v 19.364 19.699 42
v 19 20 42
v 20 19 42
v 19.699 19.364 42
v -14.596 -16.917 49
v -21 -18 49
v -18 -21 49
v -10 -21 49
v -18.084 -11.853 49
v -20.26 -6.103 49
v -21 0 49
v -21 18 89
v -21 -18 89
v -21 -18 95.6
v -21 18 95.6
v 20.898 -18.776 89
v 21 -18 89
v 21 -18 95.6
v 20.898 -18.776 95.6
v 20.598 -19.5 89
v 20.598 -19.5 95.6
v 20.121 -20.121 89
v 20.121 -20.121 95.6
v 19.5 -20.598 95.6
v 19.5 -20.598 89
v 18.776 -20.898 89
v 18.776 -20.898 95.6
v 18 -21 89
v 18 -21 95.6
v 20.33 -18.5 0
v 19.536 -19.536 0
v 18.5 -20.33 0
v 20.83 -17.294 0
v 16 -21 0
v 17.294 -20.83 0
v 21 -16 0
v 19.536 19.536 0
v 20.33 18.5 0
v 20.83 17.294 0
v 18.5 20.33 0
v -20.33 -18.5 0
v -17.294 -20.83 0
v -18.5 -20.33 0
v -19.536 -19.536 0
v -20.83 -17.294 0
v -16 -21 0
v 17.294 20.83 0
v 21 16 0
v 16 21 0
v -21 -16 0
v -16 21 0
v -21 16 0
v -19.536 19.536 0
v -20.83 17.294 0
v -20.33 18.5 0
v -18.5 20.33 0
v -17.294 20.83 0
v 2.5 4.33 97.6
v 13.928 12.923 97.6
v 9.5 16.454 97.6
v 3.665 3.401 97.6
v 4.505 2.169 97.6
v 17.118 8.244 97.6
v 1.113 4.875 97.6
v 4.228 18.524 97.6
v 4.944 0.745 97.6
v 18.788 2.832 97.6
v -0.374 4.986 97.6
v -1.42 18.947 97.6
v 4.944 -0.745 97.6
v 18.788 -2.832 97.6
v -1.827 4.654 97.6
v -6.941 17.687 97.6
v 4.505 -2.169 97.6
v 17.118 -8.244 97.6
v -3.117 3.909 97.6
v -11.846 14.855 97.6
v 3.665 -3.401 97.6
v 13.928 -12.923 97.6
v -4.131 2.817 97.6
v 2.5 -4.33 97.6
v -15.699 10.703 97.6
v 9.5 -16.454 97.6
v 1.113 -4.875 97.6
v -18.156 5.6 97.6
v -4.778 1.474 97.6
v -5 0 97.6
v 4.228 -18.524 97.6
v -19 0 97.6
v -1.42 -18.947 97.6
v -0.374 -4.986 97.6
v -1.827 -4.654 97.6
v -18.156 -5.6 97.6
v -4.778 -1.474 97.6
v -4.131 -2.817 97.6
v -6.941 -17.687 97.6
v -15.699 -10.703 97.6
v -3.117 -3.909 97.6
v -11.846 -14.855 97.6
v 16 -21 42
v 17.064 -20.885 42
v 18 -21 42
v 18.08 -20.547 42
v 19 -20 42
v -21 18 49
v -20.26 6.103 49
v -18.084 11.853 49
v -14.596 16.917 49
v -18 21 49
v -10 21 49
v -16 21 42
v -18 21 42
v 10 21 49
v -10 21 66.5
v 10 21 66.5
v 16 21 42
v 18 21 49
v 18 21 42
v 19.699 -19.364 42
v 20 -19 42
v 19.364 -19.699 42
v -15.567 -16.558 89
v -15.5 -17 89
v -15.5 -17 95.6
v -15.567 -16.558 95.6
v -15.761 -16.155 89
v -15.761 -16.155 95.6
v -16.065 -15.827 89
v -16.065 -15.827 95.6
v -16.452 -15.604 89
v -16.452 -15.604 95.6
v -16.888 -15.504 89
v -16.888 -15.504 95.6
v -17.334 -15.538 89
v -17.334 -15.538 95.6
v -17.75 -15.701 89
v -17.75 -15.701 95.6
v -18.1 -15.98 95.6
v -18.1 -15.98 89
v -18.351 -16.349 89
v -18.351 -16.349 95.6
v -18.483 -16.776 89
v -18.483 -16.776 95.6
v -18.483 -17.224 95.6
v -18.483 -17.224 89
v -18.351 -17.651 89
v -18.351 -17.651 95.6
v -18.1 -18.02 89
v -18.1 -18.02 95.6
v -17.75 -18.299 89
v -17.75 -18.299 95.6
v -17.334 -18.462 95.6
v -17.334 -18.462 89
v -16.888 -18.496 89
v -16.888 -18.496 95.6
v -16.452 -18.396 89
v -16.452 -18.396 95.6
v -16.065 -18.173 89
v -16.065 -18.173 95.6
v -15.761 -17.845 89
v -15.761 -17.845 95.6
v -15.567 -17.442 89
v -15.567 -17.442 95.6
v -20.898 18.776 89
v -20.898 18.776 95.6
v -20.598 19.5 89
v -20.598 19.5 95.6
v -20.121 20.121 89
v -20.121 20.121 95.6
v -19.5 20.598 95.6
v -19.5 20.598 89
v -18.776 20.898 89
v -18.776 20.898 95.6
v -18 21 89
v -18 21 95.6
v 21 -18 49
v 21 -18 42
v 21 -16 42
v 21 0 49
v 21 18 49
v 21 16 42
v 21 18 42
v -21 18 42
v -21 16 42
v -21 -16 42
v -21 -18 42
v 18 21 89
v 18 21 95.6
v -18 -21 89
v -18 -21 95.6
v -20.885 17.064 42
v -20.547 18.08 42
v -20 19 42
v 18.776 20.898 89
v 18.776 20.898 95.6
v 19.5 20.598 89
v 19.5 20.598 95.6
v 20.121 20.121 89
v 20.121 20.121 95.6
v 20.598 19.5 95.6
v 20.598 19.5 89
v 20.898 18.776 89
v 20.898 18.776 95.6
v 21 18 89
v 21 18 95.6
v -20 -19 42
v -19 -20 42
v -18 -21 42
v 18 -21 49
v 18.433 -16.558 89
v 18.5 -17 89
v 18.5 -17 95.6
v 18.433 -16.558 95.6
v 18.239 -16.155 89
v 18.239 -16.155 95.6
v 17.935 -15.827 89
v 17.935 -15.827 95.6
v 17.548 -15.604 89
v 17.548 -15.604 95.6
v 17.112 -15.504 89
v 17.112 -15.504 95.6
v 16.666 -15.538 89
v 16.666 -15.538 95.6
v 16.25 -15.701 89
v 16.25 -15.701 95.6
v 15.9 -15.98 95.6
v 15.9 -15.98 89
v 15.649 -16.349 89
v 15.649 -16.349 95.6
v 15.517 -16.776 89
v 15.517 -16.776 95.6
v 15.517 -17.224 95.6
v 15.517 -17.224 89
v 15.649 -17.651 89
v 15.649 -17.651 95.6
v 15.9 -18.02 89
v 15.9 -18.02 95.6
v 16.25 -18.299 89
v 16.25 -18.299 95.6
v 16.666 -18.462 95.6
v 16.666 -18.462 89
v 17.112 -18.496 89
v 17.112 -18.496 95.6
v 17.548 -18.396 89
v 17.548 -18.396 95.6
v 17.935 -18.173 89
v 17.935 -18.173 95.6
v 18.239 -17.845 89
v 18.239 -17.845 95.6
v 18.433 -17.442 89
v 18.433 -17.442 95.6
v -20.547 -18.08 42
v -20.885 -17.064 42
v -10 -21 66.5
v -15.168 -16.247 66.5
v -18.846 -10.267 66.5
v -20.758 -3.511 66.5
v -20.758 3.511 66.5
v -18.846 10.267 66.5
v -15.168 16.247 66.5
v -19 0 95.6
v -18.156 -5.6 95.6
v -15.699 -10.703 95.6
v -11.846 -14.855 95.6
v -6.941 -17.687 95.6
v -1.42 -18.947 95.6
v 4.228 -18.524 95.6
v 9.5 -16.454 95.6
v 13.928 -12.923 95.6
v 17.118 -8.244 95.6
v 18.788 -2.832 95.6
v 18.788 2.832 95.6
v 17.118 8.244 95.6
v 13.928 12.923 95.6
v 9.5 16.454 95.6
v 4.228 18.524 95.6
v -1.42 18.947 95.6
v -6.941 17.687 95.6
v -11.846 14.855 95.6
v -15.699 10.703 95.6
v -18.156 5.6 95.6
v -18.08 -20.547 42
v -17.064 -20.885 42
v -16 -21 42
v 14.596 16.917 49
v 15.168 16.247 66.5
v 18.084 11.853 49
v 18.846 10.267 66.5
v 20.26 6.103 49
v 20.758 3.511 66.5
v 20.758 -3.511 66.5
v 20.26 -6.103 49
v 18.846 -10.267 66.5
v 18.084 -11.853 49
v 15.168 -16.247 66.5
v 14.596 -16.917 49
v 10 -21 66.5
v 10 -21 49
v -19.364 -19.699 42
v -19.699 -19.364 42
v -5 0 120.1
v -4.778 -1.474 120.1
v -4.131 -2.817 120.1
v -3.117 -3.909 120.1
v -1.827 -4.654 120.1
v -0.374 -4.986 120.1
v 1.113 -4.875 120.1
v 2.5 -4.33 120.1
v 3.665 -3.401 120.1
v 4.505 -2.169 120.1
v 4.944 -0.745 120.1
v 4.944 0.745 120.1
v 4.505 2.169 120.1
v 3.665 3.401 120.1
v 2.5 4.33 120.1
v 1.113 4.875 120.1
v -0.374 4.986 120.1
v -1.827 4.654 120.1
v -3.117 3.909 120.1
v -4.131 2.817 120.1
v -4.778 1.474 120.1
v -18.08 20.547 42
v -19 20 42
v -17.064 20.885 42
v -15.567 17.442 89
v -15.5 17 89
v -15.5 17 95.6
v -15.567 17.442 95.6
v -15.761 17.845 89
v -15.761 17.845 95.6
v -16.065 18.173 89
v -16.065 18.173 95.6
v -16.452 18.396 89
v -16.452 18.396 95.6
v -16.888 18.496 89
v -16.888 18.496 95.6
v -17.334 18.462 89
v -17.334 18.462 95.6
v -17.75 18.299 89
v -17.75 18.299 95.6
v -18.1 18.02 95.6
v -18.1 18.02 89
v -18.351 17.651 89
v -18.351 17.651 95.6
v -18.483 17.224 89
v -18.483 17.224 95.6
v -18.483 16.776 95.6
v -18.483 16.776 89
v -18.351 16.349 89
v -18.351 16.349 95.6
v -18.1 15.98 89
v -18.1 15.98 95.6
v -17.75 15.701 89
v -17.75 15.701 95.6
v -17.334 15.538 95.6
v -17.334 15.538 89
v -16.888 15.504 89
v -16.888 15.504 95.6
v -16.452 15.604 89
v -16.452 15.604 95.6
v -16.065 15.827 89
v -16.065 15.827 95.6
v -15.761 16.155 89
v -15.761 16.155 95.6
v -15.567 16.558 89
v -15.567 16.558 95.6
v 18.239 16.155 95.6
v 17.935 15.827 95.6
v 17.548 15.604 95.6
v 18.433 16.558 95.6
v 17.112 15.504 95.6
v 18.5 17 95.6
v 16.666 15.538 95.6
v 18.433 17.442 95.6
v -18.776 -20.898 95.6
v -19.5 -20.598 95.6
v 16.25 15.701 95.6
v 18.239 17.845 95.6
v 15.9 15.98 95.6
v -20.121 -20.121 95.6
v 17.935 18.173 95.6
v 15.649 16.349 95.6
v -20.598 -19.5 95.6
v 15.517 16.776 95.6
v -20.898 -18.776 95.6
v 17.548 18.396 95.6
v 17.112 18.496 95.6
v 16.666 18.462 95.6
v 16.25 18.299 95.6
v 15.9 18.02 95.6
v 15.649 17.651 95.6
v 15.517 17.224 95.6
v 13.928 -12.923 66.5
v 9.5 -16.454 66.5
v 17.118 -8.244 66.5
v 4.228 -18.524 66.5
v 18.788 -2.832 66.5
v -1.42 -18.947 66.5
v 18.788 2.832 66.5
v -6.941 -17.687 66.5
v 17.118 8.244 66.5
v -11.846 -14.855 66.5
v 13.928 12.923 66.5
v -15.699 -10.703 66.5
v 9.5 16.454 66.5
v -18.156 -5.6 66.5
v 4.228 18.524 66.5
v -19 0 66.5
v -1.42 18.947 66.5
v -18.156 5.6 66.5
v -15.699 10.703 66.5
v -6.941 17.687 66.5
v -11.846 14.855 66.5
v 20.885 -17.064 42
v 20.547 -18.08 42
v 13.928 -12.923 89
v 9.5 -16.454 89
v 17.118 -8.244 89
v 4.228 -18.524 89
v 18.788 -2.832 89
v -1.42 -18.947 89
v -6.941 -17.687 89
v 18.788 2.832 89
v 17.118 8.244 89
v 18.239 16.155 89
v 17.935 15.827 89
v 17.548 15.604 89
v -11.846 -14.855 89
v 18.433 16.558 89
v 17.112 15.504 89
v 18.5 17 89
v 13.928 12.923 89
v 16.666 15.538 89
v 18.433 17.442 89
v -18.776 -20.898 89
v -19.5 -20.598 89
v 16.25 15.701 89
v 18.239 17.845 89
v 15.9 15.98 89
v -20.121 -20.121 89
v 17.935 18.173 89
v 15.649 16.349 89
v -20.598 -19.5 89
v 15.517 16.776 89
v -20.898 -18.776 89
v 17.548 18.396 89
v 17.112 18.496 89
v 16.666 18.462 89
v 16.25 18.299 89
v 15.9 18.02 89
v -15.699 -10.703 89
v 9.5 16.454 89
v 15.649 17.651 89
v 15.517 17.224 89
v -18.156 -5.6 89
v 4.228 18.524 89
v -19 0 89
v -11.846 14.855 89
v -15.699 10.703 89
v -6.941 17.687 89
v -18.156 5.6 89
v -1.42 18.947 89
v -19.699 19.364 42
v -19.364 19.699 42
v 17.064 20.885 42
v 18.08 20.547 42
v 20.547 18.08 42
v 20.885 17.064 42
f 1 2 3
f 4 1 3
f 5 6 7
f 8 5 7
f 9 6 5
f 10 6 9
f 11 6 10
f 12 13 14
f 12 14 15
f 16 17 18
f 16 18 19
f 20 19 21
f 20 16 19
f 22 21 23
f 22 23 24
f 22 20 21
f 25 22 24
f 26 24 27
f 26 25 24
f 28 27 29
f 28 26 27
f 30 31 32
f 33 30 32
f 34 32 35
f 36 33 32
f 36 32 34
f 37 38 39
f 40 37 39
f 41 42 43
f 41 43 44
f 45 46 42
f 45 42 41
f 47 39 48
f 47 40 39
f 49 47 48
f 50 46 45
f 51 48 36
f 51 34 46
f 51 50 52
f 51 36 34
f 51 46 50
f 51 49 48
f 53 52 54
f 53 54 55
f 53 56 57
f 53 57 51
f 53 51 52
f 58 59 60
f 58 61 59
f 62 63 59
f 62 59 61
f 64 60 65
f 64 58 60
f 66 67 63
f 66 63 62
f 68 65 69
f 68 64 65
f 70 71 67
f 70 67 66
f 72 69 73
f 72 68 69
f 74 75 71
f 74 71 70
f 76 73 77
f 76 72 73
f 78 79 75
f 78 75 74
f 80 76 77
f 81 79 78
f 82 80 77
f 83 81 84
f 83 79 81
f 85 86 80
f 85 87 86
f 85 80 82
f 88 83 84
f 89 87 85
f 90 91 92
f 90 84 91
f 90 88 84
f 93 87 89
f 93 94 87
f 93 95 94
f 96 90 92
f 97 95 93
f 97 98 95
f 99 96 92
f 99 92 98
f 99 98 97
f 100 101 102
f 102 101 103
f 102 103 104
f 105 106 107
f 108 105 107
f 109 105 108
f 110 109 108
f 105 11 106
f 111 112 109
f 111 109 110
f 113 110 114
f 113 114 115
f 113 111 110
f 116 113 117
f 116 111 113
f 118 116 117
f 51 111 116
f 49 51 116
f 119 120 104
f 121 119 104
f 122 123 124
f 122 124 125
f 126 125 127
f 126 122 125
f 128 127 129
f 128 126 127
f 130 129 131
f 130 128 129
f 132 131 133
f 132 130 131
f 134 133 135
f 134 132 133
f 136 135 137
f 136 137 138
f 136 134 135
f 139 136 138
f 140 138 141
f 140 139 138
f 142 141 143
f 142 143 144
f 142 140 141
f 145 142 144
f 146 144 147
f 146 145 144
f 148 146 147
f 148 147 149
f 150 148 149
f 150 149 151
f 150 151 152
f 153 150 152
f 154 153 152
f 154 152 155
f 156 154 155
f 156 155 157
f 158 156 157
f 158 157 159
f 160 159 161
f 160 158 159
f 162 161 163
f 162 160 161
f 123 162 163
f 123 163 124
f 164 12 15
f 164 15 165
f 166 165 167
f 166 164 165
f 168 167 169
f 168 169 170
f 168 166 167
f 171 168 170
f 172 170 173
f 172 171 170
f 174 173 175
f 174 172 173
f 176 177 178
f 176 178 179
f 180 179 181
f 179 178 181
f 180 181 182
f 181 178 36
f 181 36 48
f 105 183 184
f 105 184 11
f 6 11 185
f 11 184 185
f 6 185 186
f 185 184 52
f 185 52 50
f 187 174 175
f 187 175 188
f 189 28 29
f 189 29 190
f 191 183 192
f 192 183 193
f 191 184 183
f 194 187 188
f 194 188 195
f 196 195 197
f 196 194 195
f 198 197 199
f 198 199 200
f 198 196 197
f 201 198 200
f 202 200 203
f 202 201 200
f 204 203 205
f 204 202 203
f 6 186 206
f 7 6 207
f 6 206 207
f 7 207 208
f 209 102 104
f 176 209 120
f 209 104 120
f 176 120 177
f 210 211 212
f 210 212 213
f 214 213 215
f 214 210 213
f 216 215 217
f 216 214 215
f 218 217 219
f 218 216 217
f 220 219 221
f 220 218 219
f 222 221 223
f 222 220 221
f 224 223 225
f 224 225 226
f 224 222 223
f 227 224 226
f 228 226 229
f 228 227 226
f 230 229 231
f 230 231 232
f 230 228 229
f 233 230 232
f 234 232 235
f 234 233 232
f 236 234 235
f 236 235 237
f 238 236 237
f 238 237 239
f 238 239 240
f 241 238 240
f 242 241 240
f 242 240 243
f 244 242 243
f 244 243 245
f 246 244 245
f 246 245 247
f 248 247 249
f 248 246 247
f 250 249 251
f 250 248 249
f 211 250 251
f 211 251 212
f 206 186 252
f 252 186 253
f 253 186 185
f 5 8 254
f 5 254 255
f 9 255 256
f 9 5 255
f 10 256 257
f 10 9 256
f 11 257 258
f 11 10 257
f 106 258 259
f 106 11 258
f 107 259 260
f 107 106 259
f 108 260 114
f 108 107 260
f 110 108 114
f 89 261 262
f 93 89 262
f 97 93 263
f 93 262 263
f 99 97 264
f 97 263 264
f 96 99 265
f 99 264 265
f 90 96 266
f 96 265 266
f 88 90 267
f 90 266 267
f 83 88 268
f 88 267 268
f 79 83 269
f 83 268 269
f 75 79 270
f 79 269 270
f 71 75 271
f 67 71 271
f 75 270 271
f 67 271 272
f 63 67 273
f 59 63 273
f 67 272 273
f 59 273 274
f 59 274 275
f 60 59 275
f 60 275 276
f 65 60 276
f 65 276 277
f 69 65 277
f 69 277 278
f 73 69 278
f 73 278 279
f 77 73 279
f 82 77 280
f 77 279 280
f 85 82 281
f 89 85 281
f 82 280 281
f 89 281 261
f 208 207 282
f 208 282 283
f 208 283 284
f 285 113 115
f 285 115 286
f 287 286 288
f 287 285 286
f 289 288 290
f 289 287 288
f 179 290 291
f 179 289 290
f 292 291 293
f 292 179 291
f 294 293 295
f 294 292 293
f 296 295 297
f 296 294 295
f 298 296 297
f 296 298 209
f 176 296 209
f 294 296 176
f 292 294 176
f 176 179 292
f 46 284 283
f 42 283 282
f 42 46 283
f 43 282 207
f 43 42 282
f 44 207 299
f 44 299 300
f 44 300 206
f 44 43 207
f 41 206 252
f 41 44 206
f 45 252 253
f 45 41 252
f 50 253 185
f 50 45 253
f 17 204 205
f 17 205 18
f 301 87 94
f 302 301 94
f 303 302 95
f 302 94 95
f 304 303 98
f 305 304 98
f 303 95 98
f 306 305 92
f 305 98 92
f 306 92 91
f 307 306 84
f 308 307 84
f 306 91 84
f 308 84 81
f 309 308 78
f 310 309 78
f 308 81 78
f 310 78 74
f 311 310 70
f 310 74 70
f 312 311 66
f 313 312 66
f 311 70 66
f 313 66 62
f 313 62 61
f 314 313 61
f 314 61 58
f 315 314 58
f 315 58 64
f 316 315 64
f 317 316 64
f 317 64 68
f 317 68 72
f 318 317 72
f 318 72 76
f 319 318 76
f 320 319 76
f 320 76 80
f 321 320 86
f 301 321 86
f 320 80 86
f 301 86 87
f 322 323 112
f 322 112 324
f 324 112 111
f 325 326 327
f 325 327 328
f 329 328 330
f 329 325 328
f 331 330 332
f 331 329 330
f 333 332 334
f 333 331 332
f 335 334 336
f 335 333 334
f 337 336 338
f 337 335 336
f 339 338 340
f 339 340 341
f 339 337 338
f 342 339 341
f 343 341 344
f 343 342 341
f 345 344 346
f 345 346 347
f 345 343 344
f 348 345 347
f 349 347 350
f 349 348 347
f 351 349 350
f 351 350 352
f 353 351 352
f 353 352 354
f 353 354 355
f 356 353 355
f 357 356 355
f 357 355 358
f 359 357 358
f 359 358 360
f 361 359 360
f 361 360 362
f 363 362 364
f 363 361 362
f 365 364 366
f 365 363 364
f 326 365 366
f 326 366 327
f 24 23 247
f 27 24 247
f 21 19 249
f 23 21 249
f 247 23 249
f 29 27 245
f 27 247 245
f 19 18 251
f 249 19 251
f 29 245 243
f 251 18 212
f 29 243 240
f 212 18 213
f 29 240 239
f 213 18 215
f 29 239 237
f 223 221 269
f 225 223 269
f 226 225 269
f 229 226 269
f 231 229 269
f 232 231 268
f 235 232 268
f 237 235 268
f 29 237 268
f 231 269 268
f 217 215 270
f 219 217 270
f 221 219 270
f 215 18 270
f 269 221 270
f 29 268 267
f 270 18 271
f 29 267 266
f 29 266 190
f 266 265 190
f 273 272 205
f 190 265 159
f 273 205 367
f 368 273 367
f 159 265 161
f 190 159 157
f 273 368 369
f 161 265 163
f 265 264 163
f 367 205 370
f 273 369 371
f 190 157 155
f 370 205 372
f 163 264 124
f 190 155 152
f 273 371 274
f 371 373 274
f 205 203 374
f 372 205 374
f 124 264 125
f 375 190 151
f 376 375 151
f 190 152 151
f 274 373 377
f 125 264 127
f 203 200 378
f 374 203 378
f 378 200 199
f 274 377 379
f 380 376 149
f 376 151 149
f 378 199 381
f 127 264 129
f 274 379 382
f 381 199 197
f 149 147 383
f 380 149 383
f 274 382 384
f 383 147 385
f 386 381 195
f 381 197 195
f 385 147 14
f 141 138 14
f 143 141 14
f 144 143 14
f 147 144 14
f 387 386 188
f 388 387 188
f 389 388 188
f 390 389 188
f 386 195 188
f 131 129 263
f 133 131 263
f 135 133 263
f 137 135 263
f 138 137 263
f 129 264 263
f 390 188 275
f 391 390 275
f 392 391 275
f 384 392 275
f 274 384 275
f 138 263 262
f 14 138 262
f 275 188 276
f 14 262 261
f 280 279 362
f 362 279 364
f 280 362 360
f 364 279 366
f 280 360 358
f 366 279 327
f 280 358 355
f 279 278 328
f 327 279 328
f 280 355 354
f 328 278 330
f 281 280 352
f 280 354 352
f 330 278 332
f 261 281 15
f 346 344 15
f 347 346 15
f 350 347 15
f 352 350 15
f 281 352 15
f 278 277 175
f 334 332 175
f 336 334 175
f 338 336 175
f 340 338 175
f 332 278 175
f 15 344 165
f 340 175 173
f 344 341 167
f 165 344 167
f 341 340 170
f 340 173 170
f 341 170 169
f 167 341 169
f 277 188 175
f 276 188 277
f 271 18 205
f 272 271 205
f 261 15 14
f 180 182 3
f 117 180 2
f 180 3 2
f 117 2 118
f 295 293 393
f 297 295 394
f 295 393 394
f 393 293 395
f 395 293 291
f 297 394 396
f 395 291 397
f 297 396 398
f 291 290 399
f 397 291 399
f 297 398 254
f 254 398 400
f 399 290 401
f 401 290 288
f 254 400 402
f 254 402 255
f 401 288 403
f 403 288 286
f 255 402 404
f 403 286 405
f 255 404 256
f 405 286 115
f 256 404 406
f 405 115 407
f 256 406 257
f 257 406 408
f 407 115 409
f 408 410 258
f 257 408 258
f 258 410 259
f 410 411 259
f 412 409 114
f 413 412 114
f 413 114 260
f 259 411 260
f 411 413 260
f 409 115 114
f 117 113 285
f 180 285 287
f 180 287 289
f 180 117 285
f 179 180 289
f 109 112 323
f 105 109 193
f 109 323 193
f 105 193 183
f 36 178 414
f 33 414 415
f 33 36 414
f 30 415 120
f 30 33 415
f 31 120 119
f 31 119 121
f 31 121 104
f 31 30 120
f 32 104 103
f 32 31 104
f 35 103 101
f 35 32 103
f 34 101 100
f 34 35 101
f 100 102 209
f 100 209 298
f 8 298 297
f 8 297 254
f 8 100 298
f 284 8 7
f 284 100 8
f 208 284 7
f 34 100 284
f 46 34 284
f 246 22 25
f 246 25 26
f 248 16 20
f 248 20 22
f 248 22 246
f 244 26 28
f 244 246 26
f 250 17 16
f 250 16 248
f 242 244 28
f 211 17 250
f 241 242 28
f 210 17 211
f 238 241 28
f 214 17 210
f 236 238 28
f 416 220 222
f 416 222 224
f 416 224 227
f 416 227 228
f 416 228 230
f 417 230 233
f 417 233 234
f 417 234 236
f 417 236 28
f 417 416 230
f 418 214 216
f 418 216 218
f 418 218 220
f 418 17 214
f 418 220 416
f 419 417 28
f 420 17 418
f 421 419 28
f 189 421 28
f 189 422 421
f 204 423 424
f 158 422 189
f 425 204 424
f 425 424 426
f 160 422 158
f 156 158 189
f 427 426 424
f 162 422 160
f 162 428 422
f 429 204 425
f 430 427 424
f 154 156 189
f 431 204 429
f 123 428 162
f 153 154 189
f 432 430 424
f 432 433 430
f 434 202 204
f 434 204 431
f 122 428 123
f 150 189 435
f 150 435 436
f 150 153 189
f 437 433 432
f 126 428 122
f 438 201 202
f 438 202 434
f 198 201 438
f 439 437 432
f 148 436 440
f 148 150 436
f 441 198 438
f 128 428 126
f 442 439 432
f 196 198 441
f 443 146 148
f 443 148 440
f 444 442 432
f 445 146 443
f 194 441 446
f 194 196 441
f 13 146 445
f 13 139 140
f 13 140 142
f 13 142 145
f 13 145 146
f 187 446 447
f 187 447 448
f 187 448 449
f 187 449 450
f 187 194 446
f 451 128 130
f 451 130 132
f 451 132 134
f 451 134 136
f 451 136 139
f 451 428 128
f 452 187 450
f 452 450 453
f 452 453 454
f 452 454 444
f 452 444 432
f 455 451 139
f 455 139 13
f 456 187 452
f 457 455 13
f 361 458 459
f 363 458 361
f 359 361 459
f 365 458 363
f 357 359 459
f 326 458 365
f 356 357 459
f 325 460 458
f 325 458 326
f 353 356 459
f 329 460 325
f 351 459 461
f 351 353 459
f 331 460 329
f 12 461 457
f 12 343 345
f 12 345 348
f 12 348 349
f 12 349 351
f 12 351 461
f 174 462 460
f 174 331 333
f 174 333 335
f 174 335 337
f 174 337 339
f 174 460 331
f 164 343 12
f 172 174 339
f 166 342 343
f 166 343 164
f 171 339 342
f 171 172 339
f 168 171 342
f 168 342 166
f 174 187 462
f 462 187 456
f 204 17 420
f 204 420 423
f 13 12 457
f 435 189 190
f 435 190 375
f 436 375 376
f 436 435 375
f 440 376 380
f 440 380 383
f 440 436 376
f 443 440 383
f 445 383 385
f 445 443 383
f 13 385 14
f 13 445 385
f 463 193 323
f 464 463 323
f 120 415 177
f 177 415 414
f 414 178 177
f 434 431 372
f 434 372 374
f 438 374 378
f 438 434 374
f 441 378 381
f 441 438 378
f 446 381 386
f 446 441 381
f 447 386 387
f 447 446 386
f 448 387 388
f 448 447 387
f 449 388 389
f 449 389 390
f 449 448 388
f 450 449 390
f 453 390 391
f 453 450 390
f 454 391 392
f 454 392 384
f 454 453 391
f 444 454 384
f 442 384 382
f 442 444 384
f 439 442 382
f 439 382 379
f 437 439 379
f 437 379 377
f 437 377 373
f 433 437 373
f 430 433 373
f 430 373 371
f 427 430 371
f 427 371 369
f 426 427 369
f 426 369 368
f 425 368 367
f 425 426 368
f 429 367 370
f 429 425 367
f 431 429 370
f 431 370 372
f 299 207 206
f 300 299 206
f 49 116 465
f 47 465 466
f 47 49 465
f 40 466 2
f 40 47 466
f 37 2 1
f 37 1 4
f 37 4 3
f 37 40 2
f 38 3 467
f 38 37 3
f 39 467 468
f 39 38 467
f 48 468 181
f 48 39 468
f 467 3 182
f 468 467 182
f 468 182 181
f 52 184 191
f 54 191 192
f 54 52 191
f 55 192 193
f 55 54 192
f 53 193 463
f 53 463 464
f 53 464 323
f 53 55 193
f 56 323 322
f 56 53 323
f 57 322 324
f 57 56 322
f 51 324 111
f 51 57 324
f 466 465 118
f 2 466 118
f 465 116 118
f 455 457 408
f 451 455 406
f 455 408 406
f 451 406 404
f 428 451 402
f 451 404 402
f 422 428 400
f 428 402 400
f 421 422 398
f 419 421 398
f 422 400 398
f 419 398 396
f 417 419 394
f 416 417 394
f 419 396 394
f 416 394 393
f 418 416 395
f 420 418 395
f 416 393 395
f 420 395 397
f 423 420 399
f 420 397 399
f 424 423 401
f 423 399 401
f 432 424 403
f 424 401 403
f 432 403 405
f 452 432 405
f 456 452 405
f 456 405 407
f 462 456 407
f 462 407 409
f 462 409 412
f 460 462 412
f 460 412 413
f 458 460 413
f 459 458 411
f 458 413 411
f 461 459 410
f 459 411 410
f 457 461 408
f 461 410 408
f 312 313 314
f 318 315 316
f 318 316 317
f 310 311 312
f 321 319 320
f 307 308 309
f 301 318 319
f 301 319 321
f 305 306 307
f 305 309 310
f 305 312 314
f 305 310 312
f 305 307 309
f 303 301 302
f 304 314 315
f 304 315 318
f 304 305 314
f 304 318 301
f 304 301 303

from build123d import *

# Parameters (mm, degrees)
EXTRUDE_1_DEPTH = 42
EXTRUDE_2_DEPTH = 7
EXTRUDE_3_DEPTH = 17.5
SKETCH_4_R      = 19
EXTRUDE_4_DEPTH = 22.5
SKETCH_5_R      = 1.5
EXTRUDE_5_DEPTH = 6.6
SKETCH_6_R      = 19
EXTRUDE_6_DEPTH = 2
SKETCH_7_R      = 5
EXTRUDE_7_DEPTH = 22.5


with BuildPart() as part:
    # 草图1 → 凸台-拉伸1 (new body)
    with BuildSketch(Plane.XY):
        with BuildLine():
            Line((-16, 21), (16, 21))
            ThreePointArc((16, 21), (19.535533906, 19.535533906), (21, 16))
            Line((21, 16), (21, -16))
            ThreePointArc((21, -16), (19.535533906, -19.535533906), (16, -21))
            Line((16, -21), (-16, -21))
            ThreePointArc((-16, -21), (-19.535533906, -19.535533906), (-21, -16))
            Line((-21, -16), (-21, 16))
            ThreePointArc((-21, 16), (-19.535533906, 19.535533906), (-16, 21))
        make_face()
    extrude(amount=EXTRUDE_1_DEPTH)

    # 草图2 → 凸台-拉伸2 (add)
    with BuildSketch(Plane.XY.offset(42)):
        Polygon((18, 21), (-18, 21), (-21, 18), (-21, -18), (-18, -21), (18, -21), (21, -18), (21, 18), align=None)
    extrude(amount=EXTRUDE_2_DEPTH)

    # 草图3 → 凸台-拉伸3 (add)
    with BuildSketch(Plane.XY.offset(49)):
        with BuildLine():
            Line((-10, 21), (10, 21))
            ThreePointArc((10, 21), (21, 0), (10, -21))
            Line((10, -21), (-10, -21))
            ThreePointArc((-10, -21), (-21, 0), (-10, 21))
        make_face()
    extrude(amount=EXTRUDE_3_DEPTH)

    # 草图4 → 凸台-拉伸4 (add)
    with BuildSketch(Plane.XY.offset(66.5)):
        with Locations(Location((0, 0, 0), (0, 0, 180))):
            Circle(SKETCH_4_R)
    extrude(amount=EXTRUDE_4_DEPTH)

    # 草图5 → 凸台-拉伸5 (add)
    with BuildSketch(Plane.XY.offset(89)):
        with BuildLine():
            Line((-18, 21), (18, 21))
            ThreePointArc((18, 21), (20.121320344, 20.121320344), (21, 18))
            Line((21, 18), (21, -18))
            ThreePointArc((21, -18), (20.121320344, -20.121320344), (18, -21))
            Line((18, -21), (-18, -21))
            ThreePointArc((-18, -21), (-20.121320344, -20.121320344), (-21, -18))
            Line((-21, -18), (-21, 18))
            ThreePointArc((-21, 18), (-20.121320344, 20.121320344), (-18, 21))
        make_face()
        with Locations((-17, 17)):
            Circle(SKETCH_5_R, mode=Mode.SUBTRACT)
        with Locations((17, 17)):
            Circle(SKETCH_5_R, mode=Mode.SUBTRACT)
        with Locations((17, -17)):
            Circle(SKETCH_5_R, mode=Mode.SUBTRACT)
        with Locations((-17, -17)):
            Circle(SKETCH_5_R, mode=Mode.SUBTRACT)
    extrude(amount=EXTRUDE_5_DEPTH)

    # 草图6 → 凸台-拉伸6 (add)
    with BuildSketch(Plane.XY.offset(95.6)):
        with Locations(Location((0, 0, 0), (0, 0, 180))):
            Circle(SKETCH_6_R)
    extrude(amount=EXTRUDE_6_DEPTH)

    # 草图7 → 凸台-拉伸7 (add)
    with BuildSketch(Plane.XY.offset(97.6)):
        with Locations(Location((0, 0, 0), (0, 0, 180))):
            Circle(SKETCH_7_R)
    extrude(amount=EXTRUDE_7_DEPTH)


solid = part.part
